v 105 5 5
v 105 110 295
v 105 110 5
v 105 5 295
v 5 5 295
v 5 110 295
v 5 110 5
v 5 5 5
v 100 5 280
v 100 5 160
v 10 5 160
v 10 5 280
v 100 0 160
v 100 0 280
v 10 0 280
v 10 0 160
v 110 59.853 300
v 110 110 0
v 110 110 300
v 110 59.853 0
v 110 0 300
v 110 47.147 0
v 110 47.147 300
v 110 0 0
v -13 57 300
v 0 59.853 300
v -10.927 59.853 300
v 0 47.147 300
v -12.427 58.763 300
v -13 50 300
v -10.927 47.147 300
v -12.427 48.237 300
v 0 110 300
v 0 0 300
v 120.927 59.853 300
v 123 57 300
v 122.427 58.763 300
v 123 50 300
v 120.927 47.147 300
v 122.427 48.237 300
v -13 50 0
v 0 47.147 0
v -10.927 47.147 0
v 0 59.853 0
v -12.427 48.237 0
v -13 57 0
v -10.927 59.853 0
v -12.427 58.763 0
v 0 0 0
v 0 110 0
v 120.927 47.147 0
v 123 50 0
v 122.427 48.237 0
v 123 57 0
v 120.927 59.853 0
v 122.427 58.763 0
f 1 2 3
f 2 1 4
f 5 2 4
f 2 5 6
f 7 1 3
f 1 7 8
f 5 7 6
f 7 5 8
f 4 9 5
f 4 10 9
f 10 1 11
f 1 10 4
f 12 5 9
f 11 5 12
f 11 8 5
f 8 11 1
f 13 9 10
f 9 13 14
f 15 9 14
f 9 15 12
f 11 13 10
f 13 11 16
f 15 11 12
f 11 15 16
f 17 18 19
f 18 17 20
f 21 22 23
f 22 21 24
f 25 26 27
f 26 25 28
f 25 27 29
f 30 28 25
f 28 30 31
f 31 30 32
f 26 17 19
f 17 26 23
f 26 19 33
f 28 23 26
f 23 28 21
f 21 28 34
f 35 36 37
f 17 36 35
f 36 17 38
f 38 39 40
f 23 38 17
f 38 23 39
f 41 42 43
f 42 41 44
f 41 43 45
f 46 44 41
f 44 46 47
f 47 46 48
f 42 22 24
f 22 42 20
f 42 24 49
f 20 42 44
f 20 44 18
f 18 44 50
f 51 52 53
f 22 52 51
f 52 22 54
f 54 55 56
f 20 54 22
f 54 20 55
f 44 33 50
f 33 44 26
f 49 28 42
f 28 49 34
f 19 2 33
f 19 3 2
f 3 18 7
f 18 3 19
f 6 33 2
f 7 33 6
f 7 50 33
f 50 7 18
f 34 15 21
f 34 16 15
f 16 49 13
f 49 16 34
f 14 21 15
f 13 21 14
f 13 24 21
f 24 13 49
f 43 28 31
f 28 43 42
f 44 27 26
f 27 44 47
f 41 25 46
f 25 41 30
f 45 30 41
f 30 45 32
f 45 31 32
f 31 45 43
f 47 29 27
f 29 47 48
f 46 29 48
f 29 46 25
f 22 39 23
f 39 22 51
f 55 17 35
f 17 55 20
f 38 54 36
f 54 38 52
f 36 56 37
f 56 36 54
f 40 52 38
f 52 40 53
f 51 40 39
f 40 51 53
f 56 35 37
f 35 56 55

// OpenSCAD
module cabin(height, width, depth, thickness) {
  double_thickness = thickness * 2;
  quad_thickness = double_thickness * 2;
  
  union() {
    // cabin
    difference() {
      // outer box
      cube([width, depth, height]);

      union() {
        // space for the passenger and front door
        translate([thickness, thickness, thickness])
        cube([width - double_thickness, 
              depth,
              height - double_thickness]);

        // rear window
        translate([double_thickness, -thickness, (height * 0.6) - quad_thickness])
        cube([width - quad_thickness, 
              quad_thickness,
              height * 0.4]);
      }
    }
    
    // right rail
    translate([-double_thickness, (depth - 10) / 2, 0])
    minkowski() {
      cube([10, 7, height / 2]);
      cylinder(r = 3, h = height / 2);
    }
    
    // left rail
    translate([width, (depth - 10) / 2, 0])
    minkowski() {
      cube([10, 7, height / 2]);
      cylinder(r = 3, h = height / 2);
    }
  }
}
height = 300;
width = 110;
depth = 110;
thickness = 5;

cabin(height, width, depth, thickness);
